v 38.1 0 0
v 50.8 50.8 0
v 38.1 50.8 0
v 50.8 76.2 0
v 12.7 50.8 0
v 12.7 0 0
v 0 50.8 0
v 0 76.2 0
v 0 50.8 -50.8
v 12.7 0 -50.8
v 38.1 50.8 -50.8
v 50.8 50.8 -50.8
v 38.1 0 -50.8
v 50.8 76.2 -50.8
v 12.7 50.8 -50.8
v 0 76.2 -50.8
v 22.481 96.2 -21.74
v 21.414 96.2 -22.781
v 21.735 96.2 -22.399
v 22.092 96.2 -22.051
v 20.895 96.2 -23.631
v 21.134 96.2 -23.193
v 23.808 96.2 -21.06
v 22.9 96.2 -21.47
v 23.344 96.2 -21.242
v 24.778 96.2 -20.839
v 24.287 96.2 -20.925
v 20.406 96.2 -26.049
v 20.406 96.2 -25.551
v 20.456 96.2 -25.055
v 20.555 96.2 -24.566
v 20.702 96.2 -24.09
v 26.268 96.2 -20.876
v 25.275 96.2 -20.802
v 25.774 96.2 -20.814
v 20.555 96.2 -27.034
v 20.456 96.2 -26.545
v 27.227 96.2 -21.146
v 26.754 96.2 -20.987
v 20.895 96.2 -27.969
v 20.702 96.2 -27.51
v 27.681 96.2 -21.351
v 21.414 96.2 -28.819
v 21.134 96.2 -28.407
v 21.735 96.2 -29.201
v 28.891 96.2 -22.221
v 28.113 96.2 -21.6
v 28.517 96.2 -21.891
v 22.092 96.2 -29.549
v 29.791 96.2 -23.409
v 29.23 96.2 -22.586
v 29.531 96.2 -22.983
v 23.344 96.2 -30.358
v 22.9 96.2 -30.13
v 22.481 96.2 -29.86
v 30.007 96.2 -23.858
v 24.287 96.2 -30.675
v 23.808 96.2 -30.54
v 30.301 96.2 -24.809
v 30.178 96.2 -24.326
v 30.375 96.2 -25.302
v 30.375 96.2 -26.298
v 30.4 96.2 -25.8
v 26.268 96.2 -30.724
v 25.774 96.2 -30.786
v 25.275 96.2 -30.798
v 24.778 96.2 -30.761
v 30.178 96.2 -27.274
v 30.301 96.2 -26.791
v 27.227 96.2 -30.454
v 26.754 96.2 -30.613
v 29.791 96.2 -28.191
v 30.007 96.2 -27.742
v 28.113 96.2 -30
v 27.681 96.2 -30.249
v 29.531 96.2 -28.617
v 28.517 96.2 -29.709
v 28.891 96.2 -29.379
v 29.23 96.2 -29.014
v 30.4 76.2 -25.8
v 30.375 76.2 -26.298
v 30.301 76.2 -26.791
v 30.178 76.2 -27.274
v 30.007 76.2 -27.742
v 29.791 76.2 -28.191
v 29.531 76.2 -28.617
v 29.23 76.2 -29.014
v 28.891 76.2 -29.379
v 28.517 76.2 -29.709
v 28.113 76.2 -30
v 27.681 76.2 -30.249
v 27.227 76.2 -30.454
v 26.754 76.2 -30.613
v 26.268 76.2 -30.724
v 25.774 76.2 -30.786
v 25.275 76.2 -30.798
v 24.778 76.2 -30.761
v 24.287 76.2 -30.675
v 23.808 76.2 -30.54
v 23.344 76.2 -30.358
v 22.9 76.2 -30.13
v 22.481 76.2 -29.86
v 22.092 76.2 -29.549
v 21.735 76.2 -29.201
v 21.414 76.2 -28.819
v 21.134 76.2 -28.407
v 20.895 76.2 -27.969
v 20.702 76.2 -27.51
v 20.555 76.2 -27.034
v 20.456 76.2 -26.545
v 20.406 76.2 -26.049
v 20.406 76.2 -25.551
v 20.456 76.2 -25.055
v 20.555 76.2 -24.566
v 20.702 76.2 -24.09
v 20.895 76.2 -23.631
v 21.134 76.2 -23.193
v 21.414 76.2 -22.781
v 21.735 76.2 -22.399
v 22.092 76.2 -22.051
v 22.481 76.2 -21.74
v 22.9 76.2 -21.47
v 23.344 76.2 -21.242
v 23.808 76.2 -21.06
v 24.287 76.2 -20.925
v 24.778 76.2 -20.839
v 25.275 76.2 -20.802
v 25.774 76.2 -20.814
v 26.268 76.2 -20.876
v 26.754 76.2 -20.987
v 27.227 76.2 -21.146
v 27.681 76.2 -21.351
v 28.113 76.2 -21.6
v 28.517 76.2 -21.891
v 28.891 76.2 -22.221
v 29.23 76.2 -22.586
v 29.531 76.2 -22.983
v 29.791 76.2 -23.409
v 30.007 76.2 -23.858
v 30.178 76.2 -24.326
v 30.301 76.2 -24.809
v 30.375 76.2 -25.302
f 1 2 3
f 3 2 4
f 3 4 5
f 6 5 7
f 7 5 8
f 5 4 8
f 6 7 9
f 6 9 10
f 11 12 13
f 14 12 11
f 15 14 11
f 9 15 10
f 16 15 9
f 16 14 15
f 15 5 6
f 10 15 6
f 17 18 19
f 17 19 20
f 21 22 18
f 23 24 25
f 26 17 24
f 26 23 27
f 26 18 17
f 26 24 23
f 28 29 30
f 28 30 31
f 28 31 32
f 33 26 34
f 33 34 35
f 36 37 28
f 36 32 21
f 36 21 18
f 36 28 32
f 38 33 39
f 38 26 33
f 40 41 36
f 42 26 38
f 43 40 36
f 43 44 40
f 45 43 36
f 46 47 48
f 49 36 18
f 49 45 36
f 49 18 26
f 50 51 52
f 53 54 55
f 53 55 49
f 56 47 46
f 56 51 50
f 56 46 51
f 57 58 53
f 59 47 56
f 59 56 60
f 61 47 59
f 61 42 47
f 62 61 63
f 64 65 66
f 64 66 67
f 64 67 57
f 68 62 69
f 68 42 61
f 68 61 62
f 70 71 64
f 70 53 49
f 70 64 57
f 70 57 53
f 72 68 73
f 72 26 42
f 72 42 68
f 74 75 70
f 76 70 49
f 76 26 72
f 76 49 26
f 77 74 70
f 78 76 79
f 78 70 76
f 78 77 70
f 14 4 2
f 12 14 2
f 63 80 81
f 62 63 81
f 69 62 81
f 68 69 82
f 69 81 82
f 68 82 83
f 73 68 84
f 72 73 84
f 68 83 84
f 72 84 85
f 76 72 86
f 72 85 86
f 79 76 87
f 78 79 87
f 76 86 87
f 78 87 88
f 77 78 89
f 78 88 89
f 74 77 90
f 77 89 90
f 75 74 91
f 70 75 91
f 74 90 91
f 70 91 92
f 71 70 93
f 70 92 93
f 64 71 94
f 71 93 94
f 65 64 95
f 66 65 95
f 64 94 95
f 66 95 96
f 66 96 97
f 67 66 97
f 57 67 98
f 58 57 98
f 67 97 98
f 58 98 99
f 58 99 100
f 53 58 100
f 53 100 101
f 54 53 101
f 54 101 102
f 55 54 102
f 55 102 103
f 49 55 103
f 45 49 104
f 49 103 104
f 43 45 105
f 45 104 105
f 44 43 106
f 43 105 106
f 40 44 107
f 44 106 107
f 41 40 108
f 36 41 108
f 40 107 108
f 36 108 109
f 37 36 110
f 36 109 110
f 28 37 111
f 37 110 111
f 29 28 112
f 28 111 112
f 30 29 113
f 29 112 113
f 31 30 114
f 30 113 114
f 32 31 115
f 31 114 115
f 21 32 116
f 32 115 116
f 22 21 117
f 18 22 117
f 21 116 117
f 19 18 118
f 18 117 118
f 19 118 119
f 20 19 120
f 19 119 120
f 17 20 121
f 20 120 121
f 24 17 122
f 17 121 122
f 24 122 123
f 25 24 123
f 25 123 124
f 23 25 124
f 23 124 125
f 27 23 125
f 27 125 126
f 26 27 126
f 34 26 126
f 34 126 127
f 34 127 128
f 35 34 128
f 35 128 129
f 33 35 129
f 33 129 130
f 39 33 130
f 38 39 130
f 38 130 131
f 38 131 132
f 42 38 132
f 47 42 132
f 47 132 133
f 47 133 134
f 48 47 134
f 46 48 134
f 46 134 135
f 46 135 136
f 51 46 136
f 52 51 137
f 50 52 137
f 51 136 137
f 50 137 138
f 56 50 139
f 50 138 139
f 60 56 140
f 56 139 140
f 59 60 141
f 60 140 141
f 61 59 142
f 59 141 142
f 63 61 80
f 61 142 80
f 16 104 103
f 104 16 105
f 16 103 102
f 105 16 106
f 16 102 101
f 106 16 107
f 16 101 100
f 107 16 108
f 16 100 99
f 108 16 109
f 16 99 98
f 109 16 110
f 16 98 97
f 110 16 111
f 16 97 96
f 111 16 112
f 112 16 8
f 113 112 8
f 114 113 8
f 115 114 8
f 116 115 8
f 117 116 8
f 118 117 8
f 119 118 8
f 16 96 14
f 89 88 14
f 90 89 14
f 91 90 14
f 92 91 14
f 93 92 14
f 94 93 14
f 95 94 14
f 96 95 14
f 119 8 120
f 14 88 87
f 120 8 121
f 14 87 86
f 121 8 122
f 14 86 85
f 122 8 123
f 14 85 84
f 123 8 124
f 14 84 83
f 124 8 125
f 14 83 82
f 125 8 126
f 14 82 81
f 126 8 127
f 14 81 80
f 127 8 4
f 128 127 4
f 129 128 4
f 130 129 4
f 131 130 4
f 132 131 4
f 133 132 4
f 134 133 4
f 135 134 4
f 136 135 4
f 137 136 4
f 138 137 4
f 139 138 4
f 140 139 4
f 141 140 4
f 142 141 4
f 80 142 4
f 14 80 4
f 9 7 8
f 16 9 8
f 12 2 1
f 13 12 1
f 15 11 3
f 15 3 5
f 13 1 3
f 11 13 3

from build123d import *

# Parameters (mm, degrees)
BOSS_EXTRUDE2_DEPTH = 50.8
CUT_EXTRUDE2_DEPTH  = 63.5
CUT_EXTRUDE3_DEPTH  = 63.5
SKETCH3_R           = 5
BOSS_EXTRUDE3_DEPTH = 20


with BuildPart() as part:
    # Sketch1 → Boss-Extrude2 (new body)
    with BuildSketch(Plane.XY):
        Polygon((0, 0), (0, 76.2), (50.8, 76.2), (50.8, 0), (38.1, 0), (38.1, 50.8), (12.7, 50.8), (12.7, 0), align=None)
    extrude(amount=-BOSS_EXTRUDE2_DEPTH)

    # Sketch4 → Cut-Extrude2 (cut)
    with BuildSketch(Plane.XY):
        Polygon((0, 50.8), (12.7, 0), (0, 0), align=None)
    extrude(amount=-CUT_EXTRUDE2_DEPTH, mode=Mode.SUBTRACT)

    # Sketch5 → Cut-Extrude3 (cut)
    with BuildSketch(Plane.XY):
        Polygon((50.8, 50.8), (38.1, 0), (50.8, 0), align=None)
    extrude(amount=-CUT_EXTRUDE3_DEPTH, mode=Mode.SUBTRACT)

    # Sketch3 → Boss-Extrude3 (add)
    with BuildSketch(Plane(origin=(0, 76.2, 0), x_dir=(1, 0, 0), z_dir=(0, 1, 0))):
        with Locations((25.4, 25.8)):
            Circle(SKETCH3_R)
    extrude(amount=BOSS_EXTRUDE3_DEPTH)


solid = part.part
